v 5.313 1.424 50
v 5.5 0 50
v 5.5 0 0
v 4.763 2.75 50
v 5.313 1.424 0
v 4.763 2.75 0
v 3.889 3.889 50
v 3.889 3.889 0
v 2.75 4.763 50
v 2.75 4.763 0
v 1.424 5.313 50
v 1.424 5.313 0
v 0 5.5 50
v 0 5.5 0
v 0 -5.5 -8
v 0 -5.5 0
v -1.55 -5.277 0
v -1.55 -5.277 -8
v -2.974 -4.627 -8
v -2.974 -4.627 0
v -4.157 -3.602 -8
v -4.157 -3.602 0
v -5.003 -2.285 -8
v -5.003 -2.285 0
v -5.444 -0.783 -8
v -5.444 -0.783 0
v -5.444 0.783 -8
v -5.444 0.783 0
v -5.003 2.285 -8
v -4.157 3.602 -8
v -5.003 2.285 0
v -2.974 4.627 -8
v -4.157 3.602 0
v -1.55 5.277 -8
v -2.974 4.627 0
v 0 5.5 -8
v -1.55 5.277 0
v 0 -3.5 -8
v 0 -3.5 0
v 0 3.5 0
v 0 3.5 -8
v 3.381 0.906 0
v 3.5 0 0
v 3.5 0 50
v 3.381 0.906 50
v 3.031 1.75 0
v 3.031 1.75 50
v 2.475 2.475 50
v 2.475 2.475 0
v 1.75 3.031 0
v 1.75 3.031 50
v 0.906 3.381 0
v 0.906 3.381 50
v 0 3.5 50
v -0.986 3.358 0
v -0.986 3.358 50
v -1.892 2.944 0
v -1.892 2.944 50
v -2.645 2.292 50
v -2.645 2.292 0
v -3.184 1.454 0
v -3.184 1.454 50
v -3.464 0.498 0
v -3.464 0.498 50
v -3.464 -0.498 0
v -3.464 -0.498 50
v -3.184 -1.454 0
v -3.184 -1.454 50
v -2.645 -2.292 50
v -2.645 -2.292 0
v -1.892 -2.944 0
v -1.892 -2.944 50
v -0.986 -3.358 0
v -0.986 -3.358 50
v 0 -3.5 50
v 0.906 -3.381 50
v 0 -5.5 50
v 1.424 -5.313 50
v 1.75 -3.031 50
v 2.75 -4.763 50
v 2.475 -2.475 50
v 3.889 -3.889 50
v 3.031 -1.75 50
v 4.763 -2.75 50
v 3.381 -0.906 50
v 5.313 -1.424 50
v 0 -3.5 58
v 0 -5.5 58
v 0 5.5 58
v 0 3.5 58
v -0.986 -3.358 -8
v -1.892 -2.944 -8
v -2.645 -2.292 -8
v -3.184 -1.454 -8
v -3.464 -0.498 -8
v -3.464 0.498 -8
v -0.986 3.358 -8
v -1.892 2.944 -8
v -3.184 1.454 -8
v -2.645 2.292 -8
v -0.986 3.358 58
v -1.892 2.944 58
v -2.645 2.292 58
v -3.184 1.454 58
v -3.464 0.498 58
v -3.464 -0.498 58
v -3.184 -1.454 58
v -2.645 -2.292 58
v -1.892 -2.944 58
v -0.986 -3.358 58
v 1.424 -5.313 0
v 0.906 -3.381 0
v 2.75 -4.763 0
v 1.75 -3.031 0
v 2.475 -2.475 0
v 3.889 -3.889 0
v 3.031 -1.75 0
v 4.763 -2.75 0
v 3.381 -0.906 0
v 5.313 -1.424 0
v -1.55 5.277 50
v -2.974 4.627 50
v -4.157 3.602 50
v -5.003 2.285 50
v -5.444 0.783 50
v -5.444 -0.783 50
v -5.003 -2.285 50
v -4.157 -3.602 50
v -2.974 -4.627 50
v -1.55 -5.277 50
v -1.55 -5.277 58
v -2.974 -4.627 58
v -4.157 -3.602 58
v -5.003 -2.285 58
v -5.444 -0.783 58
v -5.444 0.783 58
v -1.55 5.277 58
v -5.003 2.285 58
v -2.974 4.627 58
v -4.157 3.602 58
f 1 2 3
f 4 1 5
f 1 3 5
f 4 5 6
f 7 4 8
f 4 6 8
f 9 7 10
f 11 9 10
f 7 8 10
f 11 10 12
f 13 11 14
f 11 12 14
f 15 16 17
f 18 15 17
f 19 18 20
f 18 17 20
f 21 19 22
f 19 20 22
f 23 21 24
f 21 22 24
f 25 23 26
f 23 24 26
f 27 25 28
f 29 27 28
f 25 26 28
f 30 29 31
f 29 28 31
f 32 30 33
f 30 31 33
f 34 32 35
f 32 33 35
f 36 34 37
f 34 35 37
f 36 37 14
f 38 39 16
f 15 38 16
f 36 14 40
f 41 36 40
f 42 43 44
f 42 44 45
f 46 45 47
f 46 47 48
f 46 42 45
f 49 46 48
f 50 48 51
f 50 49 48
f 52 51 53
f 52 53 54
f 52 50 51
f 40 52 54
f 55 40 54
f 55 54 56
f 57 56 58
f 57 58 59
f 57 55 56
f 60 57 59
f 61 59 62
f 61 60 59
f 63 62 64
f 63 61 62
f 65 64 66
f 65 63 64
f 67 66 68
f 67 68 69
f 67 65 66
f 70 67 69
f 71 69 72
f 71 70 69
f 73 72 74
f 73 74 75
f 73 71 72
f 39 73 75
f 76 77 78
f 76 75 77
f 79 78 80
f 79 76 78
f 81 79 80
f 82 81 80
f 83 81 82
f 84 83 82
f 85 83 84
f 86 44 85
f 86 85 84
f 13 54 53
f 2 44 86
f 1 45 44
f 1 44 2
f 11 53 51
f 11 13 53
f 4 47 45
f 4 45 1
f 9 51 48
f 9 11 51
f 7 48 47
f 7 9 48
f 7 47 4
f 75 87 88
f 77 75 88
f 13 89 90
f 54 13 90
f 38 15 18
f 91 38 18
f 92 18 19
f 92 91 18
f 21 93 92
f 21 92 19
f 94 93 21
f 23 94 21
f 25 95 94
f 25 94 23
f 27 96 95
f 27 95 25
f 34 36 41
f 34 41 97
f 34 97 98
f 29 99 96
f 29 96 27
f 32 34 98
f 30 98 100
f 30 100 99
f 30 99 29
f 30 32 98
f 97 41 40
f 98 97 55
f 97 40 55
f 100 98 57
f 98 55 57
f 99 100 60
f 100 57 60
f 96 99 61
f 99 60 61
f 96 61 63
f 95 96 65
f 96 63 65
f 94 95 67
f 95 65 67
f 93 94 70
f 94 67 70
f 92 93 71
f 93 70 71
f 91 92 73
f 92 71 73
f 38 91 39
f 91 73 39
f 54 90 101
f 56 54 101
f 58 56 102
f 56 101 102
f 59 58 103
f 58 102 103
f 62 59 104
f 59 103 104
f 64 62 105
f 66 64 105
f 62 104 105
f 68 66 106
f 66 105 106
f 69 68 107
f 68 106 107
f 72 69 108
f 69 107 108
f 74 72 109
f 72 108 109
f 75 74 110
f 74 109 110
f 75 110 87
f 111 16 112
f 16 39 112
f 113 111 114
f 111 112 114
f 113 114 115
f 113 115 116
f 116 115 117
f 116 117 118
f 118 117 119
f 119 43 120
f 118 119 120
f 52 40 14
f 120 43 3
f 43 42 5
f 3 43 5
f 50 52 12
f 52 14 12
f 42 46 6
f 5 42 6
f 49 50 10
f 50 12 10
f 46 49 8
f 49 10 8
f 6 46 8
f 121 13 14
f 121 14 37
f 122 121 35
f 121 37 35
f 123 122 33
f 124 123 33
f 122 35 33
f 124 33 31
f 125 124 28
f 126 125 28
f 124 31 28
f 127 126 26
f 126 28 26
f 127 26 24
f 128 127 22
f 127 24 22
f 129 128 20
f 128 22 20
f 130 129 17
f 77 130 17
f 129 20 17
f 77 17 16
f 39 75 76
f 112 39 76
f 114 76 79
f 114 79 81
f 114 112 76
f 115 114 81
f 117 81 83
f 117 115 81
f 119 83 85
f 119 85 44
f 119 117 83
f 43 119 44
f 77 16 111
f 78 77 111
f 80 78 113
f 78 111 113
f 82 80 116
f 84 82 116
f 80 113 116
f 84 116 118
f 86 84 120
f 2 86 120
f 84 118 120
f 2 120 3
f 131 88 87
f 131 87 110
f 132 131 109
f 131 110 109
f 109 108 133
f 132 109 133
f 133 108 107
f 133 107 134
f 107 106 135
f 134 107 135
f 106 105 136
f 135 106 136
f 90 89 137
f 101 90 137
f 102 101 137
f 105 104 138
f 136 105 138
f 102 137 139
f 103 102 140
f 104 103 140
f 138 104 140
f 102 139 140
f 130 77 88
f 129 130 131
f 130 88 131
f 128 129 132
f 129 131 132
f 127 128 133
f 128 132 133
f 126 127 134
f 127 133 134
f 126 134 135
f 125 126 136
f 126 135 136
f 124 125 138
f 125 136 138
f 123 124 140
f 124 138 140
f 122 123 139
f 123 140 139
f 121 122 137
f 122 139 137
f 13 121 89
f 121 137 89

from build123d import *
from build123d.topology import SkipClean

# Parameters (mm, degrees)
SKETCH1_R                                        = 5.5
SKETCH1_R_2                                      = 3.5
BOSS_EXTRUDE1_DLUGOSC_CALKOWITA_DEPTH            = 50
BOSS_EXTRUDE2_PRZEDLUZENIE_DO_MONTAZU_DEPTH      = 8
BOSS_EXTRUDE2_PRZEDLUZENIE_DO_MONTAZU_DEPTH_BACK = 58


with BuildPart() as part:
    # Sketch1 → Boss-Extrude1 dlugosc calkowita (new body)
    with BuildSketch(Plane.XY):
        Circle(SKETCH1_R)
        Circle(SKETCH1_R_2, mode=Mode.SUBTRACT)
    extrude(amount=BOSS_EXTRUDE1_DLUGOSC_CALKOWITA_DEPTH)

    # Sketch2 → Boss-Extrude2 przedluzenie do montazu (add, two sides: drawn at the far end of the back side and taken through both)
    with SkipClean():  # the faces are left unmerged after this step: merging them gives an invalid solid
        with BuildSketch(Plane(origin=(0, 0, 0), x_dir=(-1, 0, 0), z_dir=(0, 0, -1)).offset(-BOSS_EXTRUDE2_PRZEDLUZENIE_DO_MONTAZU_DEPTH_BACK)):
            with BuildLine():
                Line((0, 5.5), (0, 3.5))
                ThreePointArc((0, 3.5), (3.5, 0), (0, -3.5))
                Line((0, -3.5), (0, -5.5))
                ThreePointArc((0, -5.5), (5.5, 0), (0, 5.5))
            make_face()
        extrude(amount=BOSS_EXTRUDE2_PRZEDLUZENIE_DO_MONTAZU_DEPTH + BOSS_EXTRUDE2_PRZEDLUZENIE_DO_MONTAZU_DEPTH_BACK)
    add(part.part.scale(1), mode=Mode.REPLACE)  # the faces are merged on a copy


solid = part.part
